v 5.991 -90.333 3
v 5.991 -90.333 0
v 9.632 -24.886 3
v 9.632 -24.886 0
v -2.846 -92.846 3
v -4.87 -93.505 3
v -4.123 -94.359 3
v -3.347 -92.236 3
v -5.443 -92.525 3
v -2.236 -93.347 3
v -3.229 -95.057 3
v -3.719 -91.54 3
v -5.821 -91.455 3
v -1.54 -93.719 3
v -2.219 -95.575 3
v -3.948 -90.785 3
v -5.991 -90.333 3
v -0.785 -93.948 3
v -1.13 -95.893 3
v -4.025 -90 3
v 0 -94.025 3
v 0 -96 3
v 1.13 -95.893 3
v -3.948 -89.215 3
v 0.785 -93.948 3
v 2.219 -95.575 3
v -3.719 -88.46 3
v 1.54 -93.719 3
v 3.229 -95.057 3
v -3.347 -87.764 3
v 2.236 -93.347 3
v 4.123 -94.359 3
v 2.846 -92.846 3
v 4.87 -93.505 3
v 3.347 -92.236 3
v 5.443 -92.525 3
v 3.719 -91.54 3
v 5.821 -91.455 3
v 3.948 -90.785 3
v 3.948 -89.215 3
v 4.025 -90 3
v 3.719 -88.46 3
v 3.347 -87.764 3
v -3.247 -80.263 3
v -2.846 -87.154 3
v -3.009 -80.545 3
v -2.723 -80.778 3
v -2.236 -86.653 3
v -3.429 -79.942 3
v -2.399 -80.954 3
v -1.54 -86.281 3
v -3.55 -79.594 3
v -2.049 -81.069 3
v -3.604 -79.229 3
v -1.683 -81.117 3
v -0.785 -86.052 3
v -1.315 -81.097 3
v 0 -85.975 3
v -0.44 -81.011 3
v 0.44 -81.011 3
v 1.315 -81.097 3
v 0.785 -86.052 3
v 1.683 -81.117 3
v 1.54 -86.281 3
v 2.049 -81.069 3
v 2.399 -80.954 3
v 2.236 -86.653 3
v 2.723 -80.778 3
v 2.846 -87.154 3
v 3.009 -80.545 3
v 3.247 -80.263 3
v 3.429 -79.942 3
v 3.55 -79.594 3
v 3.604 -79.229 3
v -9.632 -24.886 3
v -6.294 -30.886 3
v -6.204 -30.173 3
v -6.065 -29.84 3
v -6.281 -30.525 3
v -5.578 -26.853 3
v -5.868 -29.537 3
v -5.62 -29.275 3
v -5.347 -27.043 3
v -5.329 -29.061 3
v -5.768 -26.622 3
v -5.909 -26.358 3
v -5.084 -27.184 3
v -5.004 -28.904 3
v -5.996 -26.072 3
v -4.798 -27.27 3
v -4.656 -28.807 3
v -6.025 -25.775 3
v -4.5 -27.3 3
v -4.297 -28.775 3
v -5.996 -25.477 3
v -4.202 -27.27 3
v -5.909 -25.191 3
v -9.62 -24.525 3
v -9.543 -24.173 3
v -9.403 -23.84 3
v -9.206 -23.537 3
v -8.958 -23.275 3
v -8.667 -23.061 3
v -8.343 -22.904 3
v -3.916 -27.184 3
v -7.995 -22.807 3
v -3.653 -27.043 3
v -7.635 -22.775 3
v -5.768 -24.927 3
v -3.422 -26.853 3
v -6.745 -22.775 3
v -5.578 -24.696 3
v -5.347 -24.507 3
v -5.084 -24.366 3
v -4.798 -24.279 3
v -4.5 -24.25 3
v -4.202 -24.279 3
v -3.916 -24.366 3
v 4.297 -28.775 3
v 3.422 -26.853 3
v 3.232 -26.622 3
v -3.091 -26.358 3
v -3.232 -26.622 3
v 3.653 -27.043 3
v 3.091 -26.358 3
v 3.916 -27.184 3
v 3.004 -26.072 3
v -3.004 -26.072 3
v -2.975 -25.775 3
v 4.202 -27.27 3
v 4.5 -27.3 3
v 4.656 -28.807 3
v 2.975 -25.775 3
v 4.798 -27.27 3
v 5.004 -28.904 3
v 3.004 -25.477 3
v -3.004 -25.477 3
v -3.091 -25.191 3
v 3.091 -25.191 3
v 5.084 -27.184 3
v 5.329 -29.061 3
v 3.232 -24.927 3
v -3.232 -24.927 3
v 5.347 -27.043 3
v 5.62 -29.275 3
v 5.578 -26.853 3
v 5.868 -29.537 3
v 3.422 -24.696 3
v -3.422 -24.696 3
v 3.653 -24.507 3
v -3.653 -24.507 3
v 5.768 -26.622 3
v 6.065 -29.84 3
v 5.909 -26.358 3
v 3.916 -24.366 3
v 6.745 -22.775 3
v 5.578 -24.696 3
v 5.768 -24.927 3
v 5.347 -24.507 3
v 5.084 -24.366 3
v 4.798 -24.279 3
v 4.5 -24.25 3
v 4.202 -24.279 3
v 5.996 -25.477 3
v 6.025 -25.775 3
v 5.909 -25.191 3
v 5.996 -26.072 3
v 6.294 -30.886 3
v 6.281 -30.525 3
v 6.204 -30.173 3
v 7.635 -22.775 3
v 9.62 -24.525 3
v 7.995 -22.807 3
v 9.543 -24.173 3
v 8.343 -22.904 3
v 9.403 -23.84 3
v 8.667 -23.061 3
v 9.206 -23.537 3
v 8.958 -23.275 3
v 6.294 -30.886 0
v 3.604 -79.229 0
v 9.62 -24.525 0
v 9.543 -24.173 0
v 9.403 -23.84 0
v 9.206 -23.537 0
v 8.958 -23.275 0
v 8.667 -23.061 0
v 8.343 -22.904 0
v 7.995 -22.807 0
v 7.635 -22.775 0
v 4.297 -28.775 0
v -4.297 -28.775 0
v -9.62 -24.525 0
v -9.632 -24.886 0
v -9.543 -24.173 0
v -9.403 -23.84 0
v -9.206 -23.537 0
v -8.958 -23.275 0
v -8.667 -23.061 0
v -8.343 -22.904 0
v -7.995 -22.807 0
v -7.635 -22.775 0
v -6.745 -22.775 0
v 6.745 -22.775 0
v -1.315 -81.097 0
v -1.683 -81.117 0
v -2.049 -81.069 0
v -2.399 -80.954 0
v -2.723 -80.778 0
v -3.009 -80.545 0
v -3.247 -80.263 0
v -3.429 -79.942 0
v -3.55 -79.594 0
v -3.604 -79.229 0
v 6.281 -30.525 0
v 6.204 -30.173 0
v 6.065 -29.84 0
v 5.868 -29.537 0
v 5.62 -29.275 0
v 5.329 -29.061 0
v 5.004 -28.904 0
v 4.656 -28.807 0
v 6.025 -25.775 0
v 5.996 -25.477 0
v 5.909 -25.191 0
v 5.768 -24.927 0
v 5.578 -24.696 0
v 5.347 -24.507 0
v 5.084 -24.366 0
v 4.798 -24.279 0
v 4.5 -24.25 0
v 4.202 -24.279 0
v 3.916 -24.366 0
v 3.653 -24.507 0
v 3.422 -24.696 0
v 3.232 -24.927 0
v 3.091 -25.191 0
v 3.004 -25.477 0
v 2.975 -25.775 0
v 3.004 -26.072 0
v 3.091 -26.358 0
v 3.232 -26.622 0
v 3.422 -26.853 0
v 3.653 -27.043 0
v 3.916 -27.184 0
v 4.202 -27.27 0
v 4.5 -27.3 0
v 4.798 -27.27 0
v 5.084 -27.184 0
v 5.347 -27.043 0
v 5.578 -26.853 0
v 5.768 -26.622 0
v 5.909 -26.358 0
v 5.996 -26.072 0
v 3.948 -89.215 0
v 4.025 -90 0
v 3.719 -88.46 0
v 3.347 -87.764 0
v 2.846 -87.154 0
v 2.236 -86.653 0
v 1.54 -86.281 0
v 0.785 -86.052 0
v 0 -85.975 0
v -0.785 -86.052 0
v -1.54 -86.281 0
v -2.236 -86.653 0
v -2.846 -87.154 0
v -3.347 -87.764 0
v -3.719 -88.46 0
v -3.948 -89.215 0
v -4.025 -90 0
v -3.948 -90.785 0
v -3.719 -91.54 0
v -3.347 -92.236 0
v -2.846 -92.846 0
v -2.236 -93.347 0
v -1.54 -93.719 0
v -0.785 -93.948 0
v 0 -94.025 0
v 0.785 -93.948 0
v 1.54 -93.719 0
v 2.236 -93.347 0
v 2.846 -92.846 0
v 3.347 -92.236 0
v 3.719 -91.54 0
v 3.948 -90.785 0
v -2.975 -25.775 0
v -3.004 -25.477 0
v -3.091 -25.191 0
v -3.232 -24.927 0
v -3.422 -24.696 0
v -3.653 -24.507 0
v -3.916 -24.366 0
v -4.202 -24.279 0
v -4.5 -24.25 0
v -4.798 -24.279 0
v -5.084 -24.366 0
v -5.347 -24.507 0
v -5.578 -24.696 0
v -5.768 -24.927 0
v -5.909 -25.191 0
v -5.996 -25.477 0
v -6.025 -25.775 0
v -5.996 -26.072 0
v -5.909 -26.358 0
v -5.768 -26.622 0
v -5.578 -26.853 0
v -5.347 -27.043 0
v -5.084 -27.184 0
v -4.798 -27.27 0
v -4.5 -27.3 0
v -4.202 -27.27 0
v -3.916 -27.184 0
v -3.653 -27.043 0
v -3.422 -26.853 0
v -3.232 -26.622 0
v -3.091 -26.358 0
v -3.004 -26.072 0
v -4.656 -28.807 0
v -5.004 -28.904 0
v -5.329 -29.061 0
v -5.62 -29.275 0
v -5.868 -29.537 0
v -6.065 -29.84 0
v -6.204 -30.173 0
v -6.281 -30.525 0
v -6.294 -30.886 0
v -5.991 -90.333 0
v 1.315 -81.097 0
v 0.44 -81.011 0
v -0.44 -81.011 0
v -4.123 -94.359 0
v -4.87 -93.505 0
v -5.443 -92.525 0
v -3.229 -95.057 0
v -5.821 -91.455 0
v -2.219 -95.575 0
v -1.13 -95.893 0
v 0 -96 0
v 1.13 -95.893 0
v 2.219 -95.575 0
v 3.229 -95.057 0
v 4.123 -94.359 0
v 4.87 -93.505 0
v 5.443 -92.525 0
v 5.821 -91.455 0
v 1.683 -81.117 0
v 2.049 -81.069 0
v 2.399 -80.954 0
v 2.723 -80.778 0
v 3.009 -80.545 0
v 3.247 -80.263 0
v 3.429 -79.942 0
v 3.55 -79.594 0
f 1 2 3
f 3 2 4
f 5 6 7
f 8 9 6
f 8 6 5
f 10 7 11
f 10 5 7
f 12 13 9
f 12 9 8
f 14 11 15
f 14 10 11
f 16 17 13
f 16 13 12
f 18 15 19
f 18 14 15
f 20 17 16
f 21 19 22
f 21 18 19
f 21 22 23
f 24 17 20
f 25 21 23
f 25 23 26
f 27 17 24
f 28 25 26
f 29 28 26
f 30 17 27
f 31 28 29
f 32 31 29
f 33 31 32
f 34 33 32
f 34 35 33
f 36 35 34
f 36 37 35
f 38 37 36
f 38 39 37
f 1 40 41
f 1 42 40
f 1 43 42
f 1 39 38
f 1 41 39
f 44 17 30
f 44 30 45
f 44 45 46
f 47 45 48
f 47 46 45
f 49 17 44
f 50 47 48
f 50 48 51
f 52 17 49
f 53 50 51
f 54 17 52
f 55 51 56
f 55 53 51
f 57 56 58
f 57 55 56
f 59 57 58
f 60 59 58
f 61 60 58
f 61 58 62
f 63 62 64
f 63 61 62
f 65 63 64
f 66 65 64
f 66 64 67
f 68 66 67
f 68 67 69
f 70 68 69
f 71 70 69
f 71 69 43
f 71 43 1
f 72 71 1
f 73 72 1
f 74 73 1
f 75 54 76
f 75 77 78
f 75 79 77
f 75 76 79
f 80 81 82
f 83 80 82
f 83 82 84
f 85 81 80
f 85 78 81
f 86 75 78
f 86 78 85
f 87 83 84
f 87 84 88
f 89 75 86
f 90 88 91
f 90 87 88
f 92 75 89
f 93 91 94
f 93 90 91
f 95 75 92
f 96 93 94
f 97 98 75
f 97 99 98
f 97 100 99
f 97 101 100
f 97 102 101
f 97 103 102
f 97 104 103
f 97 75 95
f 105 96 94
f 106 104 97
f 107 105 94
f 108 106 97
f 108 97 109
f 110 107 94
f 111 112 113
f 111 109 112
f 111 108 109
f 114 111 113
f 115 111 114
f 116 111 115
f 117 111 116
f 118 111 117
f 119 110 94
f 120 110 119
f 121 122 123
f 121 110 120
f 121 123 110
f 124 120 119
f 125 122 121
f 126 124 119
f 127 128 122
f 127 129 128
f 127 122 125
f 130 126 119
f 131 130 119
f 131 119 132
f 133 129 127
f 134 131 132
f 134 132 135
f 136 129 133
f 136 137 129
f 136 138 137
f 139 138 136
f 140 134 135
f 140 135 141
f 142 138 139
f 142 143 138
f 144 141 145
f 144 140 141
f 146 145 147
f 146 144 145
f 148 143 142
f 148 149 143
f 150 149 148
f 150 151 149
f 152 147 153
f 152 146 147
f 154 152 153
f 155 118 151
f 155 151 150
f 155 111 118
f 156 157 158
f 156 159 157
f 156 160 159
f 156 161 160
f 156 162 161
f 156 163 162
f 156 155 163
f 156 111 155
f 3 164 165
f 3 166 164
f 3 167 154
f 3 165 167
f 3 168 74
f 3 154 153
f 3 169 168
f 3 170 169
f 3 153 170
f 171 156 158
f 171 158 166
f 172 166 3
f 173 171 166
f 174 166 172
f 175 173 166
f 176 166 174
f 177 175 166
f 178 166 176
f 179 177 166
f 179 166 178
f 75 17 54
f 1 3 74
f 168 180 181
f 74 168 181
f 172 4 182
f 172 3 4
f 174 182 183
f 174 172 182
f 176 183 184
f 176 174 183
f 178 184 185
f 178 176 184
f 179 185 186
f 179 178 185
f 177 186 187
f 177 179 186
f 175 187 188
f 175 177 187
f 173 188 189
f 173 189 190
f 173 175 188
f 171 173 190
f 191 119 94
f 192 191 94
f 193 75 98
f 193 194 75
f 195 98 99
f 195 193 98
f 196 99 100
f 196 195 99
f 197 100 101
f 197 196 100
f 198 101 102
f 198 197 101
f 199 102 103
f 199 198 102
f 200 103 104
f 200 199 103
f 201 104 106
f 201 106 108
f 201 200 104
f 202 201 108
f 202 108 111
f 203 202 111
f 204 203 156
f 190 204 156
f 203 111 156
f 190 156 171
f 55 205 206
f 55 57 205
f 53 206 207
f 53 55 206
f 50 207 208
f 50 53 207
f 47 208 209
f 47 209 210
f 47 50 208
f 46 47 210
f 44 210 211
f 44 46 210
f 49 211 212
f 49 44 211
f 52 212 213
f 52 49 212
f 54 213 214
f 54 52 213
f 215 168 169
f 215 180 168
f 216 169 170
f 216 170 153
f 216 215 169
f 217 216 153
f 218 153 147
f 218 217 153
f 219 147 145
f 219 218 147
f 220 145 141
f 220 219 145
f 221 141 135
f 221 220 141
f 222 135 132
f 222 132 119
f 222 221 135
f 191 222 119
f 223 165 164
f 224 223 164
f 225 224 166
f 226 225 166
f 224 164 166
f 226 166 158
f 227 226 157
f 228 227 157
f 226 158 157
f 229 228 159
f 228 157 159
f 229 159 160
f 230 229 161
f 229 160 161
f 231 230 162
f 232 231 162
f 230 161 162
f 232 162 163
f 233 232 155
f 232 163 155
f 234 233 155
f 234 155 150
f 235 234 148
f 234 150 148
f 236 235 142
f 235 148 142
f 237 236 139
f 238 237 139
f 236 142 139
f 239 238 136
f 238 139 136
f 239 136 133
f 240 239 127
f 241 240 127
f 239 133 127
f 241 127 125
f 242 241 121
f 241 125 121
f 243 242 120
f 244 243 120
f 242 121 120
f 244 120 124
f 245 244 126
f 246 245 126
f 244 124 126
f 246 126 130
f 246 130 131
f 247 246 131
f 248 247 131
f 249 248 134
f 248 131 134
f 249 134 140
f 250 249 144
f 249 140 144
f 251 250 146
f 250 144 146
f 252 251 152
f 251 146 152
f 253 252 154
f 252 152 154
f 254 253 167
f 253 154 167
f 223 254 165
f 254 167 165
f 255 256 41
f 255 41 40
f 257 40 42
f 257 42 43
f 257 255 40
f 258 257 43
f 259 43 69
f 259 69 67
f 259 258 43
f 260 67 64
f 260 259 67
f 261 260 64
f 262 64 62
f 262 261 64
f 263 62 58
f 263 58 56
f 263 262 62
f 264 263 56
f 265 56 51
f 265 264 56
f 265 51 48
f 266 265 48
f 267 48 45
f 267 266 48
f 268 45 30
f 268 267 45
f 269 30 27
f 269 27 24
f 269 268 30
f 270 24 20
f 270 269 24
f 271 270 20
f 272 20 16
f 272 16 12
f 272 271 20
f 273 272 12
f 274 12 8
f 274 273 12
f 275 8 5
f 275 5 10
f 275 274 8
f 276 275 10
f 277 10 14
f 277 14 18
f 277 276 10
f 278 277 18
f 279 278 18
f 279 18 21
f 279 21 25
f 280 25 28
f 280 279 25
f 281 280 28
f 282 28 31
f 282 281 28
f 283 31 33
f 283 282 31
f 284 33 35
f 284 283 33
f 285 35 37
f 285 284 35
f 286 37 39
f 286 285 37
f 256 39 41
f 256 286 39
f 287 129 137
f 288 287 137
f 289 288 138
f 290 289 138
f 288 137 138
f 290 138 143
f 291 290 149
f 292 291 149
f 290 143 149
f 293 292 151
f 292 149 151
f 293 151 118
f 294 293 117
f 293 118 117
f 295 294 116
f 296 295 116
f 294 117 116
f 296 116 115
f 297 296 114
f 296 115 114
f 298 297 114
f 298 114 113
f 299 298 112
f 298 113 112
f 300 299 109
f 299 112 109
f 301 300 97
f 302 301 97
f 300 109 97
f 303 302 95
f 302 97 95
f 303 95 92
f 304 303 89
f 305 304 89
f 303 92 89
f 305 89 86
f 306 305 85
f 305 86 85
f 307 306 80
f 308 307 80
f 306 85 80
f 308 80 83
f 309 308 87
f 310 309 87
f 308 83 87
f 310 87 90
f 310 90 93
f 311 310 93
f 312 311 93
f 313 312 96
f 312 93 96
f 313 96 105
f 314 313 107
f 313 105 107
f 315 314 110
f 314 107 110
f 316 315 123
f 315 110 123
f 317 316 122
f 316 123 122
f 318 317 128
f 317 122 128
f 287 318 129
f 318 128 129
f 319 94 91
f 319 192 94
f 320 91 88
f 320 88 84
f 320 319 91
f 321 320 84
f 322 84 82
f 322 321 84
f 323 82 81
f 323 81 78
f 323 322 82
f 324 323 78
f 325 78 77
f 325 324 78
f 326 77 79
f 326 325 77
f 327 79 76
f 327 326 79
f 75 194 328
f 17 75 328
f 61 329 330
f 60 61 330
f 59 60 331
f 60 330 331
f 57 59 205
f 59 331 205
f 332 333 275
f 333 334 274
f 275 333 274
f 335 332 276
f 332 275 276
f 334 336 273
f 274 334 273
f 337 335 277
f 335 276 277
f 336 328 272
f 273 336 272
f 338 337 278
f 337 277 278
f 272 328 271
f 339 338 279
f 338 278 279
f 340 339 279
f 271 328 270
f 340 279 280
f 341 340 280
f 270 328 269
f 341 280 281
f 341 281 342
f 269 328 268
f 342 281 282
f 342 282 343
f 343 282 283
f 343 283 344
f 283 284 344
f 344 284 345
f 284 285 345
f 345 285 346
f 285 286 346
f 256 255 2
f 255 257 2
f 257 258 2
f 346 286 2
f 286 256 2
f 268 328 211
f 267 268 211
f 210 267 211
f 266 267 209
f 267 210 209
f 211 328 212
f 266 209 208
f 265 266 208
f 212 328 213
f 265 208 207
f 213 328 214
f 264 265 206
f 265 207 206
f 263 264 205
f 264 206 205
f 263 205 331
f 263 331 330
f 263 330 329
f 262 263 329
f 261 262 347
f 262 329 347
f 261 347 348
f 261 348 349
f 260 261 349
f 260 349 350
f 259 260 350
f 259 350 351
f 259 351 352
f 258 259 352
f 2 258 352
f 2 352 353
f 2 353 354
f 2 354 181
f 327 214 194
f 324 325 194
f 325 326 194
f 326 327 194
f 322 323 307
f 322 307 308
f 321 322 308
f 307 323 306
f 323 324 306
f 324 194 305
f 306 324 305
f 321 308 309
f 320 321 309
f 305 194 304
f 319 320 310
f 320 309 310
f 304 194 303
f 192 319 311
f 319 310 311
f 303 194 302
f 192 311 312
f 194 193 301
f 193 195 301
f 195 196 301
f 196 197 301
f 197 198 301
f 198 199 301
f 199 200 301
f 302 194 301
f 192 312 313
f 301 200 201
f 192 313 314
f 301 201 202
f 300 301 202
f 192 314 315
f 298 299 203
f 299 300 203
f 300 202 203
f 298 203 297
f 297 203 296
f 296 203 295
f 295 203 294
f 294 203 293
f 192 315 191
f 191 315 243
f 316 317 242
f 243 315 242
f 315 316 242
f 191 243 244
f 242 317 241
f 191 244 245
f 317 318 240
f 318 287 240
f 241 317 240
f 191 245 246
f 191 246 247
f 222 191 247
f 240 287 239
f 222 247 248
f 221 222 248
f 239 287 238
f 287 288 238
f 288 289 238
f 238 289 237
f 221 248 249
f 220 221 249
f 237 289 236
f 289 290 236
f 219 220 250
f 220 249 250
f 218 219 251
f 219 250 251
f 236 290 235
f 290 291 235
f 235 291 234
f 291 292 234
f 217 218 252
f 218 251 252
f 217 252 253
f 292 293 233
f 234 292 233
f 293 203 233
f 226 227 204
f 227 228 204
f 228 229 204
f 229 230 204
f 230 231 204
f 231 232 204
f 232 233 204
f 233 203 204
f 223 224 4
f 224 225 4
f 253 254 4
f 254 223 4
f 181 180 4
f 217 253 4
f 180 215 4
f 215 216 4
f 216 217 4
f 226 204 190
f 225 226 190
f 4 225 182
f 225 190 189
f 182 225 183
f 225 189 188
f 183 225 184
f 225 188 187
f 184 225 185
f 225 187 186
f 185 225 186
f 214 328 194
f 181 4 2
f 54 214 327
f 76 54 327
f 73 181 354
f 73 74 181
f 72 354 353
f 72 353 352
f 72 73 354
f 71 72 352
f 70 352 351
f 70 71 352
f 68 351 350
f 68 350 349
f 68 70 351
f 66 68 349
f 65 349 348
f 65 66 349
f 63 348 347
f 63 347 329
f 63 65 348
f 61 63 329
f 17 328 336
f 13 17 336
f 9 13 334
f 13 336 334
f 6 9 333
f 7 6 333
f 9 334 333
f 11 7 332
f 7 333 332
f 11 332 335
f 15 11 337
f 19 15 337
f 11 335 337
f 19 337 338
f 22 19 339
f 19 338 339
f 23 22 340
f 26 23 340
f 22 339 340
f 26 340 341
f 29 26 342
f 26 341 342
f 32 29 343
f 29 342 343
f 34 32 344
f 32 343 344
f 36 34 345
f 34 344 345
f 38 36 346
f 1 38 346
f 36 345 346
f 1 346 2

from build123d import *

# Parameters (mm, degrees)
SKETCH_1_R          = 11
SKETCH_1_R_2        = 3.5
SKETCH_1_R_3        = 1.01
SKETCH_1_R_4        = 6
SKETCH_1_R_5        = 4.025
EXTRUDE_1_DEPTH     = 3
SKETCH_2_R          = 1.525
EXTRUDE_2_DEPTH     = 3
SKETCH_3_W          = 24.553172336
SKETCH_3_H          = 36.576889883
CUT_EXTRUDE_1_DEPTH = 10
FILLET_1_R          = 2


with BuildPart() as part:
    # 草图1 → 凸台-拉伸1 (new body)
    # profile 1 of 3: a face of its own
    with BuildSketch(Plane.XY):
        with BuildLine():
            ThreePointArc((10.983011573, -0.611111111), (0, -11), (-10.983011573, -0.611111111))
            Line((-10.983011573, -0.611111111), (-5.990733585, -90.333333333))
            ThreePointArc((-5.990733585, -90.333333333), (-0.166731054, -84.002317051), (6, -90))
            ThreePointArc((6, -90), (5.997682949, -90.166731054), (5.990733585, -90.333333333))
            Line((5.990733585, -90.333333333), (10.983011573, -0.611111111))
        make_face()
        with BuildLine():
            Line((-3.466771313, -81.694489982), (-7.418369738, -10.675569794))
            ThreePointArc((-7.418369738, -10.675569794), (0, -13), (7.418369738, -10.675569794))
            Line((7.418369738, -10.675569794), (3.466771313, -81.694489982))
            ThreePointArc((3.466771313, -81.694489982), (0, -81), (-3.466771313, -81.694489982))
        make_face(mode=Mode.SUBTRACT)
    # profile 2 of 3: a face of its own
    with BuildSketch(Plane.XY):
        Circle(SKETCH_1_R)
        Circle(SKETCH_1_R_2, mode=Mode.SUBTRACT)
        with Locations((-2.75, 4.763139721)):
            Circle(SKETCH_1_R_3, mode=Mode.SUBTRACT)
        with Locations((-2.75, -4.763139721)):
            Circle(SKETCH_1_R_3, mode=Mode.SUBTRACT)
        with Locations((5.5, 0)):
            Circle(SKETCH_1_R_3, mode=Mode.SUBTRACT)
    # profile 3 of 3: a face of its own
    with BuildSketch(Plane.XY):
        with Locations((0, -90)):
            Circle(SKETCH_1_R_4)
        with Locations((0, -90)):
            Circle(SKETCH_1_R_5, mode=Mode.SUBTRACT)
    extrude(amount=EXTRUDE_1_DEPTH)

    # 草图2 → 凸台-拉伸2 (add)
    with BuildSketch(Plane.XY.offset(3)):
        Polygon((-6.745155967, -22.774702841), (6.745155967, -22.774702841), (6.411307036, -28.774702841), (-6.411307036, -28.774702841), align=None)
        with Locations((-4.5, -25.774702841)):
            Circle(SKETCH_2_R, mode=Mode.SUBTRACT)
        with Locations((4.5, -25.774702841)):
            Circle(SKETCH_2_R, mode=Mode.SUBTRACT)
    extrude(amount=-EXTRUDE_2_DEPTH)

    # 草图3 → 切除-拉伸1 (cut)
    with BuildSketch(Plane.XY.offset(3)):
        with Locations((0.16395552, -4.486257899)):
            Rectangle(SKETCH_3_W, SKETCH_3_H)
    extrude(amount=-CUT_EXTRUDE_1_DEPTH, mode=Mode.SUBTRACT)

    # 圆角1
    fillet_1_edges = [part.edges().sort_by_distance(p)[0] for p in [
        (-3.466771313, -81.694489982, 1.5),
        (3.466771313, -81.694489982, 1.5),
        (6.411307036, -28.774702841, 1.5),
        (-6.411307036, -28.774702841, 1.5),
        (-9.749796341, -22.774702841, 1.5),
        (9.749796341, -22.774702841, 1.5),
    ]]
    fillet(fillet_1_edges, radius=FILLET_1_R)


solid = part.part
